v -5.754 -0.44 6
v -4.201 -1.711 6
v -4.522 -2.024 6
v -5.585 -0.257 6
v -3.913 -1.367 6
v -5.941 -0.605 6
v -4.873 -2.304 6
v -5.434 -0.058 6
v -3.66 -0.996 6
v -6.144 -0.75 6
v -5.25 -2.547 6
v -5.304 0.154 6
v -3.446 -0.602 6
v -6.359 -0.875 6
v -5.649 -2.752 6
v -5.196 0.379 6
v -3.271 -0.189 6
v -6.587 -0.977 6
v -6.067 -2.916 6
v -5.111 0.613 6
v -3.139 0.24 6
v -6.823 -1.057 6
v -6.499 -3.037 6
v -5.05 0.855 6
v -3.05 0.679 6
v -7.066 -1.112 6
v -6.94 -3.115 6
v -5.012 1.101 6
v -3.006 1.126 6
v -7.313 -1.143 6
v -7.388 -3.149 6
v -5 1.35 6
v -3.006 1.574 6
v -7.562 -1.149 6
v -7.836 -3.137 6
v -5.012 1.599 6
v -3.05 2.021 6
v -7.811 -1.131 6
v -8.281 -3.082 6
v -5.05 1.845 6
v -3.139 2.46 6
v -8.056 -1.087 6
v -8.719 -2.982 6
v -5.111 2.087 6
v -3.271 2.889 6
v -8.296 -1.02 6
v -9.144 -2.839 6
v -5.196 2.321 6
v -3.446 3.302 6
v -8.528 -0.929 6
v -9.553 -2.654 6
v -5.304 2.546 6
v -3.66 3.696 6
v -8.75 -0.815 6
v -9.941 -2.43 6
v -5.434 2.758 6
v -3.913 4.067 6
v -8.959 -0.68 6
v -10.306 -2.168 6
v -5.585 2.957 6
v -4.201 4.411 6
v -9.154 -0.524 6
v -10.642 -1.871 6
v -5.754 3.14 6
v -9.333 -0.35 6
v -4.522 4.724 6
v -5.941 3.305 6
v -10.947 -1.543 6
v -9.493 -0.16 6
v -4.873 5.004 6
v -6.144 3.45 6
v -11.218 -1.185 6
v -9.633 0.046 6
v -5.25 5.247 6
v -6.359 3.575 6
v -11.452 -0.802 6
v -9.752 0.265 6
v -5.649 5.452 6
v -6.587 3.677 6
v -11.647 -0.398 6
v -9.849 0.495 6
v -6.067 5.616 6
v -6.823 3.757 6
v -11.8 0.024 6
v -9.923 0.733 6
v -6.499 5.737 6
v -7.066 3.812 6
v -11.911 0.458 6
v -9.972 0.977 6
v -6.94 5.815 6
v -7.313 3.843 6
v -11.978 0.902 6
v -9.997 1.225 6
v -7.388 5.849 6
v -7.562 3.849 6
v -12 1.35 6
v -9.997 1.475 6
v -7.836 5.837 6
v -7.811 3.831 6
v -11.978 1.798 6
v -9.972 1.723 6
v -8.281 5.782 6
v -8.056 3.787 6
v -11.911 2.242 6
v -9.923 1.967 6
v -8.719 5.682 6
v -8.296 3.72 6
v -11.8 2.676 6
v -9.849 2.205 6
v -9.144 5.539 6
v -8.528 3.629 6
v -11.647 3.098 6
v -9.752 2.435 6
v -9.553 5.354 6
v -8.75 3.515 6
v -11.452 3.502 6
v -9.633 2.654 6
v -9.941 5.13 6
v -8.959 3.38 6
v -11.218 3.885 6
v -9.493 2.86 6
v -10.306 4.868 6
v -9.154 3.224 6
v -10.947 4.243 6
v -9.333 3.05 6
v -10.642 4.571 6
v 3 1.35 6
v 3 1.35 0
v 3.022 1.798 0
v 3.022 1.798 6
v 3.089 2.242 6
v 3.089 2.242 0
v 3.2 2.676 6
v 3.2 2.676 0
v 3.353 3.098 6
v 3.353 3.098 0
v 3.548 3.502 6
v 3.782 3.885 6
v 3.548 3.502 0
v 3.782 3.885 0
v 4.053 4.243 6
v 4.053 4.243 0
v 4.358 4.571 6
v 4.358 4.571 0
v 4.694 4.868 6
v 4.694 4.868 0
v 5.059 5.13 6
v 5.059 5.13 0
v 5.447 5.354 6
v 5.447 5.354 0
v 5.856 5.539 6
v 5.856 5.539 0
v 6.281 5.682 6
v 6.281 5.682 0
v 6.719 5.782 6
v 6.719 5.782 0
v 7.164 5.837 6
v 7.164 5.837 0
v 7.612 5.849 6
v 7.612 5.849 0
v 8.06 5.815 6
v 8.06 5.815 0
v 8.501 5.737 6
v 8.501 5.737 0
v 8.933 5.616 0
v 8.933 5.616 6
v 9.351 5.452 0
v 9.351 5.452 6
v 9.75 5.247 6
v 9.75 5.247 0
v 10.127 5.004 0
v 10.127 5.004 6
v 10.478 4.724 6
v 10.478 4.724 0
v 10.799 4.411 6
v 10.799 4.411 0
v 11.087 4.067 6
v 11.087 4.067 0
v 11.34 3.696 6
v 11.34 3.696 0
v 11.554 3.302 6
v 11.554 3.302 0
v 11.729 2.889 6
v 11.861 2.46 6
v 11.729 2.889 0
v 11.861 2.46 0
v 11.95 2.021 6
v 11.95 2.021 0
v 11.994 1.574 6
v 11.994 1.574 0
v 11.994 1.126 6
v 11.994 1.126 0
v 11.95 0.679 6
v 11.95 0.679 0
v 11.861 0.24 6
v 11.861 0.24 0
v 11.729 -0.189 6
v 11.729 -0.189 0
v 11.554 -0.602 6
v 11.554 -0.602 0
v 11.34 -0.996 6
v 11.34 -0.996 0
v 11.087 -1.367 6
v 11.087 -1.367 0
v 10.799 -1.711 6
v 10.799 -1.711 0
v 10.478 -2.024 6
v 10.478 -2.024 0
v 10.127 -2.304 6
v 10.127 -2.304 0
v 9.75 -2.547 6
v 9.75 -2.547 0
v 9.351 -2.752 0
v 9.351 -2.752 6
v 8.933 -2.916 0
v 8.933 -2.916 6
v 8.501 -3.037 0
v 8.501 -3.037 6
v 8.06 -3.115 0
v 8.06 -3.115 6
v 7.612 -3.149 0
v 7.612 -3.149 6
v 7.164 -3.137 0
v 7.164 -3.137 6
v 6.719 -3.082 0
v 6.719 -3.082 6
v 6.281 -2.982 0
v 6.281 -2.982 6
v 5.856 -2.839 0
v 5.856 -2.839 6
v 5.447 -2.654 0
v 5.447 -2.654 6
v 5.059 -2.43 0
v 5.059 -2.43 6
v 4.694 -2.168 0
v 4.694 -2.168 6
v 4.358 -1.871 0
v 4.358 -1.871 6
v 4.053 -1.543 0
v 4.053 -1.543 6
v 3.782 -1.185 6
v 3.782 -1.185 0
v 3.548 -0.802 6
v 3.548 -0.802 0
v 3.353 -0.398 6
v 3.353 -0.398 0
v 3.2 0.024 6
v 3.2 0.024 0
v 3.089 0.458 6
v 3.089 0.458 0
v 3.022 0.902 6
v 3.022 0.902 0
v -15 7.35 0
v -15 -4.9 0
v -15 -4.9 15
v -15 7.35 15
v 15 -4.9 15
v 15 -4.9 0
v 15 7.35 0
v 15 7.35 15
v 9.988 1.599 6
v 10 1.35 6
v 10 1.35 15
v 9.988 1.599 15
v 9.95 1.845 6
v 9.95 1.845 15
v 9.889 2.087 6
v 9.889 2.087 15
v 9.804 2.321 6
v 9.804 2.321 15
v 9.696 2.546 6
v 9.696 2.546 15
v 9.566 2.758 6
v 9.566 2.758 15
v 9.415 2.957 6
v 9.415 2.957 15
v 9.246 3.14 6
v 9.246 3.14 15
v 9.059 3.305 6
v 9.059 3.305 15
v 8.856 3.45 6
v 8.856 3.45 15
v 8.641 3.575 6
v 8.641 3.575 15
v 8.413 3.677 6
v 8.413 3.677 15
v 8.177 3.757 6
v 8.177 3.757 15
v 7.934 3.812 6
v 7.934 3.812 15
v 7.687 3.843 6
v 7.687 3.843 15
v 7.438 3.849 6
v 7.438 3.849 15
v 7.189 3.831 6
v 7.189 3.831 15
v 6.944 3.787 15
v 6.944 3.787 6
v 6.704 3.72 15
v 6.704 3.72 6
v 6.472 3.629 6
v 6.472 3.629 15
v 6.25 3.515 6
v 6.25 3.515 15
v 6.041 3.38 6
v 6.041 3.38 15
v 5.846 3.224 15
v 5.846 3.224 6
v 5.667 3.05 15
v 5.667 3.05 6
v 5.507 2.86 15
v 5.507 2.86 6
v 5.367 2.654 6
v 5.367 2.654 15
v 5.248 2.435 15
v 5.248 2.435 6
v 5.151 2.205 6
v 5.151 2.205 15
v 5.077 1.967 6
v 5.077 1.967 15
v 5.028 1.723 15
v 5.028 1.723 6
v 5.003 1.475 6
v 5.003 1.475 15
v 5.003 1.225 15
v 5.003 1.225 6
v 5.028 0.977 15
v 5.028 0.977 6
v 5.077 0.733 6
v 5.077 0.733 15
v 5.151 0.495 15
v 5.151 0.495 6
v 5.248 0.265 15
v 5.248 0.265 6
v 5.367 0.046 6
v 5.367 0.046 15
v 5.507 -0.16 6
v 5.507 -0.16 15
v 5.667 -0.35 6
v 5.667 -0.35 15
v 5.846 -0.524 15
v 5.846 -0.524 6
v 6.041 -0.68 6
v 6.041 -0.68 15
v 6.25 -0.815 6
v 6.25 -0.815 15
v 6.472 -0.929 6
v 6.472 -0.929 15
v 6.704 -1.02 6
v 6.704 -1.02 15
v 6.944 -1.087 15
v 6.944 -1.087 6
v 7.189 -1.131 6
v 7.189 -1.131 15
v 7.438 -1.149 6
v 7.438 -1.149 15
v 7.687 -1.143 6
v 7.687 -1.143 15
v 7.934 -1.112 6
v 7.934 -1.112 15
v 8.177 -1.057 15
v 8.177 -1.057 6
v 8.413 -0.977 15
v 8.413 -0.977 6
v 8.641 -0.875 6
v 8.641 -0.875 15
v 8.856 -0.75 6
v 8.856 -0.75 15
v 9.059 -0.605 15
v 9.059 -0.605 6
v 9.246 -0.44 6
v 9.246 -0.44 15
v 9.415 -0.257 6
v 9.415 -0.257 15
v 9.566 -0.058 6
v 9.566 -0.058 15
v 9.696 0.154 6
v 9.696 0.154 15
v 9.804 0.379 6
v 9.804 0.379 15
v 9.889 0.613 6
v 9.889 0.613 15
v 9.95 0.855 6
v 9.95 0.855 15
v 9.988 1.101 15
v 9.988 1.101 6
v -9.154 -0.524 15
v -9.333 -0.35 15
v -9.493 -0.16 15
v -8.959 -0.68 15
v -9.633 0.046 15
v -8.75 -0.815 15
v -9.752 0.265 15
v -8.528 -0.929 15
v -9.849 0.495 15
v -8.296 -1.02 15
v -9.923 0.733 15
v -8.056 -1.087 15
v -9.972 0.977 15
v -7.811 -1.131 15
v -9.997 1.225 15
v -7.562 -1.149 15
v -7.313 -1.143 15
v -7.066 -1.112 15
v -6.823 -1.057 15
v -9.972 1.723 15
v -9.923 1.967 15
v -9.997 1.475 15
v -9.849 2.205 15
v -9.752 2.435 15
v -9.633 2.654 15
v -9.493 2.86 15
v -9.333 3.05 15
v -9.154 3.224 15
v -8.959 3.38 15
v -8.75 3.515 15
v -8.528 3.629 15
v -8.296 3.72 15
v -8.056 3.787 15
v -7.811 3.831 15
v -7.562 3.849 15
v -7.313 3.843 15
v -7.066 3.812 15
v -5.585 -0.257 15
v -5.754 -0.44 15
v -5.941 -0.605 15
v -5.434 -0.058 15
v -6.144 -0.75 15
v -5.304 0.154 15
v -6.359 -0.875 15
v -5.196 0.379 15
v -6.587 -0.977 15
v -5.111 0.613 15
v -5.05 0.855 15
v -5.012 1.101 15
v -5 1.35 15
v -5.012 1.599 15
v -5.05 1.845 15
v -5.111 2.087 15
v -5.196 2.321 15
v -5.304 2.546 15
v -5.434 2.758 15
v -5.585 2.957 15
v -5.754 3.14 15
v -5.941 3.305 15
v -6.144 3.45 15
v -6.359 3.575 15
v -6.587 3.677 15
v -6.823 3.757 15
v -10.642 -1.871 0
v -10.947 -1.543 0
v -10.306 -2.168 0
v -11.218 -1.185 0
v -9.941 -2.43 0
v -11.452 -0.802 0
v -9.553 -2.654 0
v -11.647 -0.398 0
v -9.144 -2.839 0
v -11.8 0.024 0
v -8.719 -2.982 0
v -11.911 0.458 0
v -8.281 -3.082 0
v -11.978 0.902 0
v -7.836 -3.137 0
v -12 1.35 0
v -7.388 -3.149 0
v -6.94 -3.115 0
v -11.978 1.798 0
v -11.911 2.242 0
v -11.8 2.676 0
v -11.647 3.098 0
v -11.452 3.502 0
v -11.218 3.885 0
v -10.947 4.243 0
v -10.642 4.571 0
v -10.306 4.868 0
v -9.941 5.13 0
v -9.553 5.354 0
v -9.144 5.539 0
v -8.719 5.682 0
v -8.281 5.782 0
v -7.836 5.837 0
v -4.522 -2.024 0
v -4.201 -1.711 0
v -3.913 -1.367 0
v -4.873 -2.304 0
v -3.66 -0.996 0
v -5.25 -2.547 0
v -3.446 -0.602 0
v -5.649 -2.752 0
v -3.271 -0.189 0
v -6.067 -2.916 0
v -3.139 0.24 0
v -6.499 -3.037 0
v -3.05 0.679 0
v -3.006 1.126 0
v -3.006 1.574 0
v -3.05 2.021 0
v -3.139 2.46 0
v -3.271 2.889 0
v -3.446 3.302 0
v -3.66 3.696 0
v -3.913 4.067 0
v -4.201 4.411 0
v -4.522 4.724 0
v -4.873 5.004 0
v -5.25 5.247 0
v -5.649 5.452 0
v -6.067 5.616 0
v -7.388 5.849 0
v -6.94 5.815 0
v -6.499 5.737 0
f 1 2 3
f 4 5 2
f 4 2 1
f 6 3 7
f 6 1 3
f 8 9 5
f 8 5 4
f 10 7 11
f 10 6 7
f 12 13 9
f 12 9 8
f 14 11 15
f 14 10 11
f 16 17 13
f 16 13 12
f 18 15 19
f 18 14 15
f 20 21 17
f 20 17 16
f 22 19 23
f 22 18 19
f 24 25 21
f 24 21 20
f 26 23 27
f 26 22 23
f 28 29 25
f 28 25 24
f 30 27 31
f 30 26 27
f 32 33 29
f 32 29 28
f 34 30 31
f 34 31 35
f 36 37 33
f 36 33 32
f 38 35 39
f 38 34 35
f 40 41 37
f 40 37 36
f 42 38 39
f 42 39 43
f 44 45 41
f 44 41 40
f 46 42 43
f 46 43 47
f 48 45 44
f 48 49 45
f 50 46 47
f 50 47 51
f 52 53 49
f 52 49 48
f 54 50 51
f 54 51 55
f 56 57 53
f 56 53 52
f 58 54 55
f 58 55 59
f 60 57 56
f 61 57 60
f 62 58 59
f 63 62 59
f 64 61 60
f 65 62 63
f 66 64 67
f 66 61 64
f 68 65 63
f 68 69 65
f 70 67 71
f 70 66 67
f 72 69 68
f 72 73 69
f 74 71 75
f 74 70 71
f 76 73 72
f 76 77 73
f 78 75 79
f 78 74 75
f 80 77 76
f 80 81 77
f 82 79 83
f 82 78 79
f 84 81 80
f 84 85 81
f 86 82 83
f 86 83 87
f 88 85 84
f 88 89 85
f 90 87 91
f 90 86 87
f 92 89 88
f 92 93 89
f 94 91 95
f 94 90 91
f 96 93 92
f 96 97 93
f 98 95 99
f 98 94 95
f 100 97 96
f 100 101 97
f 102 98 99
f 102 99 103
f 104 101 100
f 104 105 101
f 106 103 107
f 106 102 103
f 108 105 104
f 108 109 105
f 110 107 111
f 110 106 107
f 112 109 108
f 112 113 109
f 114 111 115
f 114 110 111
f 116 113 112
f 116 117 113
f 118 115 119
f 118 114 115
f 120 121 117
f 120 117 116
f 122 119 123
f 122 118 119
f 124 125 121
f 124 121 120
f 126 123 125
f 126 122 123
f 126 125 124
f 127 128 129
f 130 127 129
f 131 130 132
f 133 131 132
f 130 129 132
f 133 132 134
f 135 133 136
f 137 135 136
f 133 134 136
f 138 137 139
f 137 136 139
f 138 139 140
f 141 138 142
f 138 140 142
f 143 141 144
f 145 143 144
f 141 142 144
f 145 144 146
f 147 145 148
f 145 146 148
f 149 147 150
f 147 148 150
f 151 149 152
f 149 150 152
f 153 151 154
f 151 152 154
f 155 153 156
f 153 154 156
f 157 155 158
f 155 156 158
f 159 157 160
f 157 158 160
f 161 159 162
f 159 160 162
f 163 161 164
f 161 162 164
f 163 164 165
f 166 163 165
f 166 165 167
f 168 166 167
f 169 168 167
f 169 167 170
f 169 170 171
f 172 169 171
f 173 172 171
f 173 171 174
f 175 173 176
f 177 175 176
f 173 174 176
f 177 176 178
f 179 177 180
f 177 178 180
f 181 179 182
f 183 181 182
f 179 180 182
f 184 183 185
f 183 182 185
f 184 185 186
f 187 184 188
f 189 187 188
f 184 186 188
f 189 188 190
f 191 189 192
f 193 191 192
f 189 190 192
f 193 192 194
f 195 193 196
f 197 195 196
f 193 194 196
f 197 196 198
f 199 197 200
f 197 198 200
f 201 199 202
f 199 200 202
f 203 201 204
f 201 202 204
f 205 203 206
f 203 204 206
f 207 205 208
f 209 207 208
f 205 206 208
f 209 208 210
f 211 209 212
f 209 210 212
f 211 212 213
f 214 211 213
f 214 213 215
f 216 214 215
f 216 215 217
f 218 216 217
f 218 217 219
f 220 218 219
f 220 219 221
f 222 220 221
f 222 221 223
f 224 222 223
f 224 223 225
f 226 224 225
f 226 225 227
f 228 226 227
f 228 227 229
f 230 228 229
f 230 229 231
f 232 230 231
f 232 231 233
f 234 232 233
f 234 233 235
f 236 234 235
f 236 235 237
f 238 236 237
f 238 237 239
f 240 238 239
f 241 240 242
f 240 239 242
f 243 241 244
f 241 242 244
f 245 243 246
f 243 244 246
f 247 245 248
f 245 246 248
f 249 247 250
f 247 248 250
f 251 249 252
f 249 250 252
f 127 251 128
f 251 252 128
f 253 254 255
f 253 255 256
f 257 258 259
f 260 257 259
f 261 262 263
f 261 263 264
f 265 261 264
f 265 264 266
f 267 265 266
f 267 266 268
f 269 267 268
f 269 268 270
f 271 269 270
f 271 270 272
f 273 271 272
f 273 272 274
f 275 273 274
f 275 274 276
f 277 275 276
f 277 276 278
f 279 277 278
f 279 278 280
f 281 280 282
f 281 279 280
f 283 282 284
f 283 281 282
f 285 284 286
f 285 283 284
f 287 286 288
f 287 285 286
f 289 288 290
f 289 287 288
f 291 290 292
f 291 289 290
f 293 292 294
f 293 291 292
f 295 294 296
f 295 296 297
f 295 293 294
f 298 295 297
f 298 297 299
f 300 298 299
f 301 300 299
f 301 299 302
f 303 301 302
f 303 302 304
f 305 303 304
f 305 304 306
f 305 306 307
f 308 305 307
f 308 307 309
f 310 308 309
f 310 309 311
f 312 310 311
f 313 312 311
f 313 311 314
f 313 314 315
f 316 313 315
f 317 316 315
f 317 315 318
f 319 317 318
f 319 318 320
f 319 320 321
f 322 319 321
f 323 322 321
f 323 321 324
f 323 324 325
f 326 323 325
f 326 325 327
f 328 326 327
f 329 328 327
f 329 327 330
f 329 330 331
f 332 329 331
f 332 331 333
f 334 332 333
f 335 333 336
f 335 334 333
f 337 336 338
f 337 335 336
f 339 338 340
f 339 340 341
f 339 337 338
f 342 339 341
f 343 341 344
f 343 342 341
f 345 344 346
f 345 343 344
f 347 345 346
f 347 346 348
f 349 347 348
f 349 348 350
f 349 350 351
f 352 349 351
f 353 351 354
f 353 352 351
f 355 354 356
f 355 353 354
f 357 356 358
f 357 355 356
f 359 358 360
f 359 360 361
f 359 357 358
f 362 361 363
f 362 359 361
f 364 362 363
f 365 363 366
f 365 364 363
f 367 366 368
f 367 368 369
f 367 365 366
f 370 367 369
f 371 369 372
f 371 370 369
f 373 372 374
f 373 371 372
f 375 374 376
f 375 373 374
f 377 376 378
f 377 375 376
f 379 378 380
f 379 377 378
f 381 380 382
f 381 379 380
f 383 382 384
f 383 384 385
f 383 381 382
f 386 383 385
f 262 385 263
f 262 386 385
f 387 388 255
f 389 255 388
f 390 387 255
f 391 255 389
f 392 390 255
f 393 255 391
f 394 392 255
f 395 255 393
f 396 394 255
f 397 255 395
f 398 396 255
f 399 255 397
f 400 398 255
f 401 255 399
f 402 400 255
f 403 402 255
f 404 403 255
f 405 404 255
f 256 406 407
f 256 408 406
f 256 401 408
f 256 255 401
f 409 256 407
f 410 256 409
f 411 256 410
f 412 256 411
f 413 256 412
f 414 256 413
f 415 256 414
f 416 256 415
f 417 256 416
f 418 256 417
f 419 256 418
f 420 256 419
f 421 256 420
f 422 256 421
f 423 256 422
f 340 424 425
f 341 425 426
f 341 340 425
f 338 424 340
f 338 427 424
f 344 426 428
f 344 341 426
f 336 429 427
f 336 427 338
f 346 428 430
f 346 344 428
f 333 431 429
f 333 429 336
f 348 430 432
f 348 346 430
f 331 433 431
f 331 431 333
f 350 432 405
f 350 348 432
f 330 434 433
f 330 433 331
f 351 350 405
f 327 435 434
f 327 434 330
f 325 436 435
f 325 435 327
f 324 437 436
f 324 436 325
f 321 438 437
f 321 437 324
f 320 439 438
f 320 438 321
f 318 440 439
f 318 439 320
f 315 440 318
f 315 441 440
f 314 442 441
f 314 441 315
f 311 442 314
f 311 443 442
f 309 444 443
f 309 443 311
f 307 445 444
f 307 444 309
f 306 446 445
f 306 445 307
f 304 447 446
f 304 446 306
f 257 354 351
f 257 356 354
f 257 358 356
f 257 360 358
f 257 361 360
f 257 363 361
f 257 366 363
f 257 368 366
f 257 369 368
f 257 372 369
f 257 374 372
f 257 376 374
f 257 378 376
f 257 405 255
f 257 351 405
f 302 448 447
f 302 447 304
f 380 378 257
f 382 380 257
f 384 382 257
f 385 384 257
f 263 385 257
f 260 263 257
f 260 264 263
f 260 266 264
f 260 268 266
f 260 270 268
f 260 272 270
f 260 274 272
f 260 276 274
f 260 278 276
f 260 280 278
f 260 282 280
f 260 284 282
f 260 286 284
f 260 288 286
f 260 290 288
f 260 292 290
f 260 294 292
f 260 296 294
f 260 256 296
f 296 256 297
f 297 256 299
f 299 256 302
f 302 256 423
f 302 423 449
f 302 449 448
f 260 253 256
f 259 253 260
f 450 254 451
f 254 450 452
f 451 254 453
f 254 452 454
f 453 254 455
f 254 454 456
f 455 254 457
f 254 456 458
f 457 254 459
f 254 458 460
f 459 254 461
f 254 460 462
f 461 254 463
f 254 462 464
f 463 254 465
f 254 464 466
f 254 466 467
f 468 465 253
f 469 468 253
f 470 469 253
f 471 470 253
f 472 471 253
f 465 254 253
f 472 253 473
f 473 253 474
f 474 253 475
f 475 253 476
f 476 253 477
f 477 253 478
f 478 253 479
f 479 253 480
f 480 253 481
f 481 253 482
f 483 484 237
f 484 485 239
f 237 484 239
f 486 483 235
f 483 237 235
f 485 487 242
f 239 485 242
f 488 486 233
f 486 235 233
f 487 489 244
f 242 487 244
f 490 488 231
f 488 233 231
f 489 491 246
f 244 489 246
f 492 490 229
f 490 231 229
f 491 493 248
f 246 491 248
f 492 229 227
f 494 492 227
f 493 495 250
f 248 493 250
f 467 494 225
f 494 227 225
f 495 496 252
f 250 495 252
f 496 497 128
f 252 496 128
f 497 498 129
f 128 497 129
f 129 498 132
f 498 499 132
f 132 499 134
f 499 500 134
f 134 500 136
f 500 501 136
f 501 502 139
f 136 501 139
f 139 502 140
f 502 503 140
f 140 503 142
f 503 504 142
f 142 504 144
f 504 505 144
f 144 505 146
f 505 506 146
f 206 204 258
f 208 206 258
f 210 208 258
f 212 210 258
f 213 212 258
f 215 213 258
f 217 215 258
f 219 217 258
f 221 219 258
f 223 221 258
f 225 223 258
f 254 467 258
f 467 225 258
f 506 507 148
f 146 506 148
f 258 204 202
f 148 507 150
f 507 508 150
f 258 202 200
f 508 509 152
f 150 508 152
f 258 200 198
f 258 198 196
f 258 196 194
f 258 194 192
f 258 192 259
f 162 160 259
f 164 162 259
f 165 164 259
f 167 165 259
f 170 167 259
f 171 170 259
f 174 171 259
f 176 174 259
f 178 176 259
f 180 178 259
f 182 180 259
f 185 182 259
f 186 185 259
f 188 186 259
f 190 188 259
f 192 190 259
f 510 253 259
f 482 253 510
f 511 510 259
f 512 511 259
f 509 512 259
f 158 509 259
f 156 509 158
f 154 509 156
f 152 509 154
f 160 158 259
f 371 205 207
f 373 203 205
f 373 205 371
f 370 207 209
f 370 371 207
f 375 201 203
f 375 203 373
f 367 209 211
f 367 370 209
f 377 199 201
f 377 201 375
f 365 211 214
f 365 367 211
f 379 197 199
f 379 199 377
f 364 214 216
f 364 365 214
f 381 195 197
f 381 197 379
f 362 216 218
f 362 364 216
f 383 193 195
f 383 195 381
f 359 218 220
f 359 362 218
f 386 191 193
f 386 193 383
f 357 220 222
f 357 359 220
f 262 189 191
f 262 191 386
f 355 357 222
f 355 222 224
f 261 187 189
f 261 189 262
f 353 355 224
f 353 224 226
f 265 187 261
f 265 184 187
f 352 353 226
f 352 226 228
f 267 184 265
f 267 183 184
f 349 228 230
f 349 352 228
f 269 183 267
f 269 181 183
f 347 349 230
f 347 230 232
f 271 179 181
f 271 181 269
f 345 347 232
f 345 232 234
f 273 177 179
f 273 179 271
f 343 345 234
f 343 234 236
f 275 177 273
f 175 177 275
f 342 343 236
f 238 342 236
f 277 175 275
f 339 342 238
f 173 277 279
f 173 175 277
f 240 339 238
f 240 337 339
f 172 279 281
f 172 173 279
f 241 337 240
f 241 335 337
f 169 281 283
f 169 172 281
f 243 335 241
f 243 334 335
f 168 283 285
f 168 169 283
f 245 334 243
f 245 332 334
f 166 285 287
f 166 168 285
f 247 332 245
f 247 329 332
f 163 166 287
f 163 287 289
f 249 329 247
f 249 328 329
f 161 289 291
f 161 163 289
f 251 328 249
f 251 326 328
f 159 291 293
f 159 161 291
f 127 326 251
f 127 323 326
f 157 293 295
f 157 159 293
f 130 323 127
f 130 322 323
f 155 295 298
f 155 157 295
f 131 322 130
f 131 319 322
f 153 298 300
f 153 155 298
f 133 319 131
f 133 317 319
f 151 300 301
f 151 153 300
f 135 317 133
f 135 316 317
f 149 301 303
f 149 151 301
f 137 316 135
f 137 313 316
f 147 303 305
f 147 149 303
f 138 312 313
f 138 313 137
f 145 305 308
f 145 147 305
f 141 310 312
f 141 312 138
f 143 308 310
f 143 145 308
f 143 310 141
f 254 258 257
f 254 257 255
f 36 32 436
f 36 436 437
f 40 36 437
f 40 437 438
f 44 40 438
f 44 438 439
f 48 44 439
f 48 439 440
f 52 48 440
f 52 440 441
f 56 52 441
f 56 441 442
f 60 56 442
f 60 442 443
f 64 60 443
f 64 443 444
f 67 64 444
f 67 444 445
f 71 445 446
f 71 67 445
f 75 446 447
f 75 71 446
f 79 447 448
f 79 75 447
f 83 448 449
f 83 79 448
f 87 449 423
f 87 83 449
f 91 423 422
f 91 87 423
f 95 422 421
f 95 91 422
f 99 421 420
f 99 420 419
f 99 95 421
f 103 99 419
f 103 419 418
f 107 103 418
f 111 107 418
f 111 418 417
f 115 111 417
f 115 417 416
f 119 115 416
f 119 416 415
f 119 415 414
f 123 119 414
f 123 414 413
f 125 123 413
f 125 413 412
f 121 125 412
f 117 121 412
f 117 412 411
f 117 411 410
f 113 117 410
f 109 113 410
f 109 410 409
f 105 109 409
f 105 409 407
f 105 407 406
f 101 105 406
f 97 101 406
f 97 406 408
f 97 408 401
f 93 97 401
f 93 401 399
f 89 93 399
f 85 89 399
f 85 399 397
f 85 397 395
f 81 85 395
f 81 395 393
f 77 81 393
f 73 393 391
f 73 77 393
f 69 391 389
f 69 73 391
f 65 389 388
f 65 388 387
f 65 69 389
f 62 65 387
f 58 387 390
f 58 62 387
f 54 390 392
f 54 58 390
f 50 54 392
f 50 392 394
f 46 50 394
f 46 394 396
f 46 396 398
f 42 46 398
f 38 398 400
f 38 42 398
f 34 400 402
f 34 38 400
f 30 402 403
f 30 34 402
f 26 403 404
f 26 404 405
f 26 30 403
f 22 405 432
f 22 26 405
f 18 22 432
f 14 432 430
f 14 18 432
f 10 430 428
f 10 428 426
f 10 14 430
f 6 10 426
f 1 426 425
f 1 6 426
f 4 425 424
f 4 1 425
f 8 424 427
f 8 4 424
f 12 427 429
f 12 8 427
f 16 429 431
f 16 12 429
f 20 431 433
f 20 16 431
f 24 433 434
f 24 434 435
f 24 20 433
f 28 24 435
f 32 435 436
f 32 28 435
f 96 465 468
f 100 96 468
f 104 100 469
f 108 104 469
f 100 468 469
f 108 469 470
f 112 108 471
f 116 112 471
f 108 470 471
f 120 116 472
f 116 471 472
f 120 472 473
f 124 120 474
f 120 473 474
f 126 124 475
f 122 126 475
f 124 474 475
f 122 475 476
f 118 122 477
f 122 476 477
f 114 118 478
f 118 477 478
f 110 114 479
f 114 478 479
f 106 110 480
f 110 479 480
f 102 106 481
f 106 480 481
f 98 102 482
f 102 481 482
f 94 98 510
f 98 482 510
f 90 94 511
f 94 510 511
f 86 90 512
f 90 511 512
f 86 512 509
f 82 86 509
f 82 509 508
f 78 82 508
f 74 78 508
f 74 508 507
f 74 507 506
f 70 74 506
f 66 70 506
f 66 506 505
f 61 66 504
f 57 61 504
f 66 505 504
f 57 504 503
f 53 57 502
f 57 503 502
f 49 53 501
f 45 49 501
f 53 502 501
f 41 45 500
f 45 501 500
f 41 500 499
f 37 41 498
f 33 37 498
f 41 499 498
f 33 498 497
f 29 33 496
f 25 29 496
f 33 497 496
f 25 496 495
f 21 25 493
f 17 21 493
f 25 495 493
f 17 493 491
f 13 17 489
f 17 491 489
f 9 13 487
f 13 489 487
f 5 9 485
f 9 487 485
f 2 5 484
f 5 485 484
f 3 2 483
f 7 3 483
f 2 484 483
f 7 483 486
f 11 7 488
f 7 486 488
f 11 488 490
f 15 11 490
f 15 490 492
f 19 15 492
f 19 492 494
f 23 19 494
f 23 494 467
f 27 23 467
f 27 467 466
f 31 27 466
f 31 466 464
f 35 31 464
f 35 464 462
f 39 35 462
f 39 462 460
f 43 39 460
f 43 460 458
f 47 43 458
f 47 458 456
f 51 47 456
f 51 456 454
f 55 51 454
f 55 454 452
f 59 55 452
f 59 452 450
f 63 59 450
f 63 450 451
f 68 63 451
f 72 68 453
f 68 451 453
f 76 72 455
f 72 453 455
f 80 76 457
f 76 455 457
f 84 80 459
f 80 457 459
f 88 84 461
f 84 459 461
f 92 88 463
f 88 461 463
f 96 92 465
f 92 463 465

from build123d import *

# Parameters (mm, degrees)
SKETCH1_W           = 30
SKETCH1_H           = 14.7
SKETCH1_R           = 2.5
BOSS_EXTRUDE1_DEPTH = 15
SKETCH4_R           = 4.5
CUT_EXTRUDE1_DEPTH  = 6
SKETCH6_W           = 43.790019277
SKETCH6_H           = 8.282134106
CUT_EXTRUDE2_DEPTH  = 23.45044543


with BuildPart() as part:
    # Sketch1 → Boss-Extrude1 (new body)
    with BuildSketch(Plane.XY):
        Rectangle(SKETCH1_W, SKETCH1_H)
        with Locations((7.5, 1.35)):
            Circle(SKETCH1_R, mode=Mode.SUBTRACT)
        with Locations((-7.5, 1.35)):
            Circle(SKETCH1_R, mode=Mode.SUBTRACT)
    extrude(amount=BOSS_EXTRUDE1_DEPTH)

    # Sketch4 → Cut-Extrude1 (cut)
    with BuildSketch(Plane(origin=(0, 0, 0), x_dir=(-1, 0, 0), z_dir=(0, 0, -1))):
        with Locations((-7.5, 1.35)):
            Circle(SKETCH4_R)
        with Locations((7.5, 1.35)):
            Circle(SKETCH4_R)
    extrude(amount=-CUT_EXTRUDE1_DEPTH, mode=Mode.SUBTRACT)

    # Sketch6 → Cut-Extrude2 (cut, through all)
    with BuildSketch(Plane(origin=(0, 0, 0), x_dir=(-1, 0, 0), z_dir=(0, 0, -1))):
        with Locations((2.714530428, -9.041067053)):
            Rectangle(SKETCH6_W, SKETCH6_H)
    extrude(amount=-CUT_EXTRUDE2_DEPTH, mode=Mode.SUBTRACT)


solid = part.part
